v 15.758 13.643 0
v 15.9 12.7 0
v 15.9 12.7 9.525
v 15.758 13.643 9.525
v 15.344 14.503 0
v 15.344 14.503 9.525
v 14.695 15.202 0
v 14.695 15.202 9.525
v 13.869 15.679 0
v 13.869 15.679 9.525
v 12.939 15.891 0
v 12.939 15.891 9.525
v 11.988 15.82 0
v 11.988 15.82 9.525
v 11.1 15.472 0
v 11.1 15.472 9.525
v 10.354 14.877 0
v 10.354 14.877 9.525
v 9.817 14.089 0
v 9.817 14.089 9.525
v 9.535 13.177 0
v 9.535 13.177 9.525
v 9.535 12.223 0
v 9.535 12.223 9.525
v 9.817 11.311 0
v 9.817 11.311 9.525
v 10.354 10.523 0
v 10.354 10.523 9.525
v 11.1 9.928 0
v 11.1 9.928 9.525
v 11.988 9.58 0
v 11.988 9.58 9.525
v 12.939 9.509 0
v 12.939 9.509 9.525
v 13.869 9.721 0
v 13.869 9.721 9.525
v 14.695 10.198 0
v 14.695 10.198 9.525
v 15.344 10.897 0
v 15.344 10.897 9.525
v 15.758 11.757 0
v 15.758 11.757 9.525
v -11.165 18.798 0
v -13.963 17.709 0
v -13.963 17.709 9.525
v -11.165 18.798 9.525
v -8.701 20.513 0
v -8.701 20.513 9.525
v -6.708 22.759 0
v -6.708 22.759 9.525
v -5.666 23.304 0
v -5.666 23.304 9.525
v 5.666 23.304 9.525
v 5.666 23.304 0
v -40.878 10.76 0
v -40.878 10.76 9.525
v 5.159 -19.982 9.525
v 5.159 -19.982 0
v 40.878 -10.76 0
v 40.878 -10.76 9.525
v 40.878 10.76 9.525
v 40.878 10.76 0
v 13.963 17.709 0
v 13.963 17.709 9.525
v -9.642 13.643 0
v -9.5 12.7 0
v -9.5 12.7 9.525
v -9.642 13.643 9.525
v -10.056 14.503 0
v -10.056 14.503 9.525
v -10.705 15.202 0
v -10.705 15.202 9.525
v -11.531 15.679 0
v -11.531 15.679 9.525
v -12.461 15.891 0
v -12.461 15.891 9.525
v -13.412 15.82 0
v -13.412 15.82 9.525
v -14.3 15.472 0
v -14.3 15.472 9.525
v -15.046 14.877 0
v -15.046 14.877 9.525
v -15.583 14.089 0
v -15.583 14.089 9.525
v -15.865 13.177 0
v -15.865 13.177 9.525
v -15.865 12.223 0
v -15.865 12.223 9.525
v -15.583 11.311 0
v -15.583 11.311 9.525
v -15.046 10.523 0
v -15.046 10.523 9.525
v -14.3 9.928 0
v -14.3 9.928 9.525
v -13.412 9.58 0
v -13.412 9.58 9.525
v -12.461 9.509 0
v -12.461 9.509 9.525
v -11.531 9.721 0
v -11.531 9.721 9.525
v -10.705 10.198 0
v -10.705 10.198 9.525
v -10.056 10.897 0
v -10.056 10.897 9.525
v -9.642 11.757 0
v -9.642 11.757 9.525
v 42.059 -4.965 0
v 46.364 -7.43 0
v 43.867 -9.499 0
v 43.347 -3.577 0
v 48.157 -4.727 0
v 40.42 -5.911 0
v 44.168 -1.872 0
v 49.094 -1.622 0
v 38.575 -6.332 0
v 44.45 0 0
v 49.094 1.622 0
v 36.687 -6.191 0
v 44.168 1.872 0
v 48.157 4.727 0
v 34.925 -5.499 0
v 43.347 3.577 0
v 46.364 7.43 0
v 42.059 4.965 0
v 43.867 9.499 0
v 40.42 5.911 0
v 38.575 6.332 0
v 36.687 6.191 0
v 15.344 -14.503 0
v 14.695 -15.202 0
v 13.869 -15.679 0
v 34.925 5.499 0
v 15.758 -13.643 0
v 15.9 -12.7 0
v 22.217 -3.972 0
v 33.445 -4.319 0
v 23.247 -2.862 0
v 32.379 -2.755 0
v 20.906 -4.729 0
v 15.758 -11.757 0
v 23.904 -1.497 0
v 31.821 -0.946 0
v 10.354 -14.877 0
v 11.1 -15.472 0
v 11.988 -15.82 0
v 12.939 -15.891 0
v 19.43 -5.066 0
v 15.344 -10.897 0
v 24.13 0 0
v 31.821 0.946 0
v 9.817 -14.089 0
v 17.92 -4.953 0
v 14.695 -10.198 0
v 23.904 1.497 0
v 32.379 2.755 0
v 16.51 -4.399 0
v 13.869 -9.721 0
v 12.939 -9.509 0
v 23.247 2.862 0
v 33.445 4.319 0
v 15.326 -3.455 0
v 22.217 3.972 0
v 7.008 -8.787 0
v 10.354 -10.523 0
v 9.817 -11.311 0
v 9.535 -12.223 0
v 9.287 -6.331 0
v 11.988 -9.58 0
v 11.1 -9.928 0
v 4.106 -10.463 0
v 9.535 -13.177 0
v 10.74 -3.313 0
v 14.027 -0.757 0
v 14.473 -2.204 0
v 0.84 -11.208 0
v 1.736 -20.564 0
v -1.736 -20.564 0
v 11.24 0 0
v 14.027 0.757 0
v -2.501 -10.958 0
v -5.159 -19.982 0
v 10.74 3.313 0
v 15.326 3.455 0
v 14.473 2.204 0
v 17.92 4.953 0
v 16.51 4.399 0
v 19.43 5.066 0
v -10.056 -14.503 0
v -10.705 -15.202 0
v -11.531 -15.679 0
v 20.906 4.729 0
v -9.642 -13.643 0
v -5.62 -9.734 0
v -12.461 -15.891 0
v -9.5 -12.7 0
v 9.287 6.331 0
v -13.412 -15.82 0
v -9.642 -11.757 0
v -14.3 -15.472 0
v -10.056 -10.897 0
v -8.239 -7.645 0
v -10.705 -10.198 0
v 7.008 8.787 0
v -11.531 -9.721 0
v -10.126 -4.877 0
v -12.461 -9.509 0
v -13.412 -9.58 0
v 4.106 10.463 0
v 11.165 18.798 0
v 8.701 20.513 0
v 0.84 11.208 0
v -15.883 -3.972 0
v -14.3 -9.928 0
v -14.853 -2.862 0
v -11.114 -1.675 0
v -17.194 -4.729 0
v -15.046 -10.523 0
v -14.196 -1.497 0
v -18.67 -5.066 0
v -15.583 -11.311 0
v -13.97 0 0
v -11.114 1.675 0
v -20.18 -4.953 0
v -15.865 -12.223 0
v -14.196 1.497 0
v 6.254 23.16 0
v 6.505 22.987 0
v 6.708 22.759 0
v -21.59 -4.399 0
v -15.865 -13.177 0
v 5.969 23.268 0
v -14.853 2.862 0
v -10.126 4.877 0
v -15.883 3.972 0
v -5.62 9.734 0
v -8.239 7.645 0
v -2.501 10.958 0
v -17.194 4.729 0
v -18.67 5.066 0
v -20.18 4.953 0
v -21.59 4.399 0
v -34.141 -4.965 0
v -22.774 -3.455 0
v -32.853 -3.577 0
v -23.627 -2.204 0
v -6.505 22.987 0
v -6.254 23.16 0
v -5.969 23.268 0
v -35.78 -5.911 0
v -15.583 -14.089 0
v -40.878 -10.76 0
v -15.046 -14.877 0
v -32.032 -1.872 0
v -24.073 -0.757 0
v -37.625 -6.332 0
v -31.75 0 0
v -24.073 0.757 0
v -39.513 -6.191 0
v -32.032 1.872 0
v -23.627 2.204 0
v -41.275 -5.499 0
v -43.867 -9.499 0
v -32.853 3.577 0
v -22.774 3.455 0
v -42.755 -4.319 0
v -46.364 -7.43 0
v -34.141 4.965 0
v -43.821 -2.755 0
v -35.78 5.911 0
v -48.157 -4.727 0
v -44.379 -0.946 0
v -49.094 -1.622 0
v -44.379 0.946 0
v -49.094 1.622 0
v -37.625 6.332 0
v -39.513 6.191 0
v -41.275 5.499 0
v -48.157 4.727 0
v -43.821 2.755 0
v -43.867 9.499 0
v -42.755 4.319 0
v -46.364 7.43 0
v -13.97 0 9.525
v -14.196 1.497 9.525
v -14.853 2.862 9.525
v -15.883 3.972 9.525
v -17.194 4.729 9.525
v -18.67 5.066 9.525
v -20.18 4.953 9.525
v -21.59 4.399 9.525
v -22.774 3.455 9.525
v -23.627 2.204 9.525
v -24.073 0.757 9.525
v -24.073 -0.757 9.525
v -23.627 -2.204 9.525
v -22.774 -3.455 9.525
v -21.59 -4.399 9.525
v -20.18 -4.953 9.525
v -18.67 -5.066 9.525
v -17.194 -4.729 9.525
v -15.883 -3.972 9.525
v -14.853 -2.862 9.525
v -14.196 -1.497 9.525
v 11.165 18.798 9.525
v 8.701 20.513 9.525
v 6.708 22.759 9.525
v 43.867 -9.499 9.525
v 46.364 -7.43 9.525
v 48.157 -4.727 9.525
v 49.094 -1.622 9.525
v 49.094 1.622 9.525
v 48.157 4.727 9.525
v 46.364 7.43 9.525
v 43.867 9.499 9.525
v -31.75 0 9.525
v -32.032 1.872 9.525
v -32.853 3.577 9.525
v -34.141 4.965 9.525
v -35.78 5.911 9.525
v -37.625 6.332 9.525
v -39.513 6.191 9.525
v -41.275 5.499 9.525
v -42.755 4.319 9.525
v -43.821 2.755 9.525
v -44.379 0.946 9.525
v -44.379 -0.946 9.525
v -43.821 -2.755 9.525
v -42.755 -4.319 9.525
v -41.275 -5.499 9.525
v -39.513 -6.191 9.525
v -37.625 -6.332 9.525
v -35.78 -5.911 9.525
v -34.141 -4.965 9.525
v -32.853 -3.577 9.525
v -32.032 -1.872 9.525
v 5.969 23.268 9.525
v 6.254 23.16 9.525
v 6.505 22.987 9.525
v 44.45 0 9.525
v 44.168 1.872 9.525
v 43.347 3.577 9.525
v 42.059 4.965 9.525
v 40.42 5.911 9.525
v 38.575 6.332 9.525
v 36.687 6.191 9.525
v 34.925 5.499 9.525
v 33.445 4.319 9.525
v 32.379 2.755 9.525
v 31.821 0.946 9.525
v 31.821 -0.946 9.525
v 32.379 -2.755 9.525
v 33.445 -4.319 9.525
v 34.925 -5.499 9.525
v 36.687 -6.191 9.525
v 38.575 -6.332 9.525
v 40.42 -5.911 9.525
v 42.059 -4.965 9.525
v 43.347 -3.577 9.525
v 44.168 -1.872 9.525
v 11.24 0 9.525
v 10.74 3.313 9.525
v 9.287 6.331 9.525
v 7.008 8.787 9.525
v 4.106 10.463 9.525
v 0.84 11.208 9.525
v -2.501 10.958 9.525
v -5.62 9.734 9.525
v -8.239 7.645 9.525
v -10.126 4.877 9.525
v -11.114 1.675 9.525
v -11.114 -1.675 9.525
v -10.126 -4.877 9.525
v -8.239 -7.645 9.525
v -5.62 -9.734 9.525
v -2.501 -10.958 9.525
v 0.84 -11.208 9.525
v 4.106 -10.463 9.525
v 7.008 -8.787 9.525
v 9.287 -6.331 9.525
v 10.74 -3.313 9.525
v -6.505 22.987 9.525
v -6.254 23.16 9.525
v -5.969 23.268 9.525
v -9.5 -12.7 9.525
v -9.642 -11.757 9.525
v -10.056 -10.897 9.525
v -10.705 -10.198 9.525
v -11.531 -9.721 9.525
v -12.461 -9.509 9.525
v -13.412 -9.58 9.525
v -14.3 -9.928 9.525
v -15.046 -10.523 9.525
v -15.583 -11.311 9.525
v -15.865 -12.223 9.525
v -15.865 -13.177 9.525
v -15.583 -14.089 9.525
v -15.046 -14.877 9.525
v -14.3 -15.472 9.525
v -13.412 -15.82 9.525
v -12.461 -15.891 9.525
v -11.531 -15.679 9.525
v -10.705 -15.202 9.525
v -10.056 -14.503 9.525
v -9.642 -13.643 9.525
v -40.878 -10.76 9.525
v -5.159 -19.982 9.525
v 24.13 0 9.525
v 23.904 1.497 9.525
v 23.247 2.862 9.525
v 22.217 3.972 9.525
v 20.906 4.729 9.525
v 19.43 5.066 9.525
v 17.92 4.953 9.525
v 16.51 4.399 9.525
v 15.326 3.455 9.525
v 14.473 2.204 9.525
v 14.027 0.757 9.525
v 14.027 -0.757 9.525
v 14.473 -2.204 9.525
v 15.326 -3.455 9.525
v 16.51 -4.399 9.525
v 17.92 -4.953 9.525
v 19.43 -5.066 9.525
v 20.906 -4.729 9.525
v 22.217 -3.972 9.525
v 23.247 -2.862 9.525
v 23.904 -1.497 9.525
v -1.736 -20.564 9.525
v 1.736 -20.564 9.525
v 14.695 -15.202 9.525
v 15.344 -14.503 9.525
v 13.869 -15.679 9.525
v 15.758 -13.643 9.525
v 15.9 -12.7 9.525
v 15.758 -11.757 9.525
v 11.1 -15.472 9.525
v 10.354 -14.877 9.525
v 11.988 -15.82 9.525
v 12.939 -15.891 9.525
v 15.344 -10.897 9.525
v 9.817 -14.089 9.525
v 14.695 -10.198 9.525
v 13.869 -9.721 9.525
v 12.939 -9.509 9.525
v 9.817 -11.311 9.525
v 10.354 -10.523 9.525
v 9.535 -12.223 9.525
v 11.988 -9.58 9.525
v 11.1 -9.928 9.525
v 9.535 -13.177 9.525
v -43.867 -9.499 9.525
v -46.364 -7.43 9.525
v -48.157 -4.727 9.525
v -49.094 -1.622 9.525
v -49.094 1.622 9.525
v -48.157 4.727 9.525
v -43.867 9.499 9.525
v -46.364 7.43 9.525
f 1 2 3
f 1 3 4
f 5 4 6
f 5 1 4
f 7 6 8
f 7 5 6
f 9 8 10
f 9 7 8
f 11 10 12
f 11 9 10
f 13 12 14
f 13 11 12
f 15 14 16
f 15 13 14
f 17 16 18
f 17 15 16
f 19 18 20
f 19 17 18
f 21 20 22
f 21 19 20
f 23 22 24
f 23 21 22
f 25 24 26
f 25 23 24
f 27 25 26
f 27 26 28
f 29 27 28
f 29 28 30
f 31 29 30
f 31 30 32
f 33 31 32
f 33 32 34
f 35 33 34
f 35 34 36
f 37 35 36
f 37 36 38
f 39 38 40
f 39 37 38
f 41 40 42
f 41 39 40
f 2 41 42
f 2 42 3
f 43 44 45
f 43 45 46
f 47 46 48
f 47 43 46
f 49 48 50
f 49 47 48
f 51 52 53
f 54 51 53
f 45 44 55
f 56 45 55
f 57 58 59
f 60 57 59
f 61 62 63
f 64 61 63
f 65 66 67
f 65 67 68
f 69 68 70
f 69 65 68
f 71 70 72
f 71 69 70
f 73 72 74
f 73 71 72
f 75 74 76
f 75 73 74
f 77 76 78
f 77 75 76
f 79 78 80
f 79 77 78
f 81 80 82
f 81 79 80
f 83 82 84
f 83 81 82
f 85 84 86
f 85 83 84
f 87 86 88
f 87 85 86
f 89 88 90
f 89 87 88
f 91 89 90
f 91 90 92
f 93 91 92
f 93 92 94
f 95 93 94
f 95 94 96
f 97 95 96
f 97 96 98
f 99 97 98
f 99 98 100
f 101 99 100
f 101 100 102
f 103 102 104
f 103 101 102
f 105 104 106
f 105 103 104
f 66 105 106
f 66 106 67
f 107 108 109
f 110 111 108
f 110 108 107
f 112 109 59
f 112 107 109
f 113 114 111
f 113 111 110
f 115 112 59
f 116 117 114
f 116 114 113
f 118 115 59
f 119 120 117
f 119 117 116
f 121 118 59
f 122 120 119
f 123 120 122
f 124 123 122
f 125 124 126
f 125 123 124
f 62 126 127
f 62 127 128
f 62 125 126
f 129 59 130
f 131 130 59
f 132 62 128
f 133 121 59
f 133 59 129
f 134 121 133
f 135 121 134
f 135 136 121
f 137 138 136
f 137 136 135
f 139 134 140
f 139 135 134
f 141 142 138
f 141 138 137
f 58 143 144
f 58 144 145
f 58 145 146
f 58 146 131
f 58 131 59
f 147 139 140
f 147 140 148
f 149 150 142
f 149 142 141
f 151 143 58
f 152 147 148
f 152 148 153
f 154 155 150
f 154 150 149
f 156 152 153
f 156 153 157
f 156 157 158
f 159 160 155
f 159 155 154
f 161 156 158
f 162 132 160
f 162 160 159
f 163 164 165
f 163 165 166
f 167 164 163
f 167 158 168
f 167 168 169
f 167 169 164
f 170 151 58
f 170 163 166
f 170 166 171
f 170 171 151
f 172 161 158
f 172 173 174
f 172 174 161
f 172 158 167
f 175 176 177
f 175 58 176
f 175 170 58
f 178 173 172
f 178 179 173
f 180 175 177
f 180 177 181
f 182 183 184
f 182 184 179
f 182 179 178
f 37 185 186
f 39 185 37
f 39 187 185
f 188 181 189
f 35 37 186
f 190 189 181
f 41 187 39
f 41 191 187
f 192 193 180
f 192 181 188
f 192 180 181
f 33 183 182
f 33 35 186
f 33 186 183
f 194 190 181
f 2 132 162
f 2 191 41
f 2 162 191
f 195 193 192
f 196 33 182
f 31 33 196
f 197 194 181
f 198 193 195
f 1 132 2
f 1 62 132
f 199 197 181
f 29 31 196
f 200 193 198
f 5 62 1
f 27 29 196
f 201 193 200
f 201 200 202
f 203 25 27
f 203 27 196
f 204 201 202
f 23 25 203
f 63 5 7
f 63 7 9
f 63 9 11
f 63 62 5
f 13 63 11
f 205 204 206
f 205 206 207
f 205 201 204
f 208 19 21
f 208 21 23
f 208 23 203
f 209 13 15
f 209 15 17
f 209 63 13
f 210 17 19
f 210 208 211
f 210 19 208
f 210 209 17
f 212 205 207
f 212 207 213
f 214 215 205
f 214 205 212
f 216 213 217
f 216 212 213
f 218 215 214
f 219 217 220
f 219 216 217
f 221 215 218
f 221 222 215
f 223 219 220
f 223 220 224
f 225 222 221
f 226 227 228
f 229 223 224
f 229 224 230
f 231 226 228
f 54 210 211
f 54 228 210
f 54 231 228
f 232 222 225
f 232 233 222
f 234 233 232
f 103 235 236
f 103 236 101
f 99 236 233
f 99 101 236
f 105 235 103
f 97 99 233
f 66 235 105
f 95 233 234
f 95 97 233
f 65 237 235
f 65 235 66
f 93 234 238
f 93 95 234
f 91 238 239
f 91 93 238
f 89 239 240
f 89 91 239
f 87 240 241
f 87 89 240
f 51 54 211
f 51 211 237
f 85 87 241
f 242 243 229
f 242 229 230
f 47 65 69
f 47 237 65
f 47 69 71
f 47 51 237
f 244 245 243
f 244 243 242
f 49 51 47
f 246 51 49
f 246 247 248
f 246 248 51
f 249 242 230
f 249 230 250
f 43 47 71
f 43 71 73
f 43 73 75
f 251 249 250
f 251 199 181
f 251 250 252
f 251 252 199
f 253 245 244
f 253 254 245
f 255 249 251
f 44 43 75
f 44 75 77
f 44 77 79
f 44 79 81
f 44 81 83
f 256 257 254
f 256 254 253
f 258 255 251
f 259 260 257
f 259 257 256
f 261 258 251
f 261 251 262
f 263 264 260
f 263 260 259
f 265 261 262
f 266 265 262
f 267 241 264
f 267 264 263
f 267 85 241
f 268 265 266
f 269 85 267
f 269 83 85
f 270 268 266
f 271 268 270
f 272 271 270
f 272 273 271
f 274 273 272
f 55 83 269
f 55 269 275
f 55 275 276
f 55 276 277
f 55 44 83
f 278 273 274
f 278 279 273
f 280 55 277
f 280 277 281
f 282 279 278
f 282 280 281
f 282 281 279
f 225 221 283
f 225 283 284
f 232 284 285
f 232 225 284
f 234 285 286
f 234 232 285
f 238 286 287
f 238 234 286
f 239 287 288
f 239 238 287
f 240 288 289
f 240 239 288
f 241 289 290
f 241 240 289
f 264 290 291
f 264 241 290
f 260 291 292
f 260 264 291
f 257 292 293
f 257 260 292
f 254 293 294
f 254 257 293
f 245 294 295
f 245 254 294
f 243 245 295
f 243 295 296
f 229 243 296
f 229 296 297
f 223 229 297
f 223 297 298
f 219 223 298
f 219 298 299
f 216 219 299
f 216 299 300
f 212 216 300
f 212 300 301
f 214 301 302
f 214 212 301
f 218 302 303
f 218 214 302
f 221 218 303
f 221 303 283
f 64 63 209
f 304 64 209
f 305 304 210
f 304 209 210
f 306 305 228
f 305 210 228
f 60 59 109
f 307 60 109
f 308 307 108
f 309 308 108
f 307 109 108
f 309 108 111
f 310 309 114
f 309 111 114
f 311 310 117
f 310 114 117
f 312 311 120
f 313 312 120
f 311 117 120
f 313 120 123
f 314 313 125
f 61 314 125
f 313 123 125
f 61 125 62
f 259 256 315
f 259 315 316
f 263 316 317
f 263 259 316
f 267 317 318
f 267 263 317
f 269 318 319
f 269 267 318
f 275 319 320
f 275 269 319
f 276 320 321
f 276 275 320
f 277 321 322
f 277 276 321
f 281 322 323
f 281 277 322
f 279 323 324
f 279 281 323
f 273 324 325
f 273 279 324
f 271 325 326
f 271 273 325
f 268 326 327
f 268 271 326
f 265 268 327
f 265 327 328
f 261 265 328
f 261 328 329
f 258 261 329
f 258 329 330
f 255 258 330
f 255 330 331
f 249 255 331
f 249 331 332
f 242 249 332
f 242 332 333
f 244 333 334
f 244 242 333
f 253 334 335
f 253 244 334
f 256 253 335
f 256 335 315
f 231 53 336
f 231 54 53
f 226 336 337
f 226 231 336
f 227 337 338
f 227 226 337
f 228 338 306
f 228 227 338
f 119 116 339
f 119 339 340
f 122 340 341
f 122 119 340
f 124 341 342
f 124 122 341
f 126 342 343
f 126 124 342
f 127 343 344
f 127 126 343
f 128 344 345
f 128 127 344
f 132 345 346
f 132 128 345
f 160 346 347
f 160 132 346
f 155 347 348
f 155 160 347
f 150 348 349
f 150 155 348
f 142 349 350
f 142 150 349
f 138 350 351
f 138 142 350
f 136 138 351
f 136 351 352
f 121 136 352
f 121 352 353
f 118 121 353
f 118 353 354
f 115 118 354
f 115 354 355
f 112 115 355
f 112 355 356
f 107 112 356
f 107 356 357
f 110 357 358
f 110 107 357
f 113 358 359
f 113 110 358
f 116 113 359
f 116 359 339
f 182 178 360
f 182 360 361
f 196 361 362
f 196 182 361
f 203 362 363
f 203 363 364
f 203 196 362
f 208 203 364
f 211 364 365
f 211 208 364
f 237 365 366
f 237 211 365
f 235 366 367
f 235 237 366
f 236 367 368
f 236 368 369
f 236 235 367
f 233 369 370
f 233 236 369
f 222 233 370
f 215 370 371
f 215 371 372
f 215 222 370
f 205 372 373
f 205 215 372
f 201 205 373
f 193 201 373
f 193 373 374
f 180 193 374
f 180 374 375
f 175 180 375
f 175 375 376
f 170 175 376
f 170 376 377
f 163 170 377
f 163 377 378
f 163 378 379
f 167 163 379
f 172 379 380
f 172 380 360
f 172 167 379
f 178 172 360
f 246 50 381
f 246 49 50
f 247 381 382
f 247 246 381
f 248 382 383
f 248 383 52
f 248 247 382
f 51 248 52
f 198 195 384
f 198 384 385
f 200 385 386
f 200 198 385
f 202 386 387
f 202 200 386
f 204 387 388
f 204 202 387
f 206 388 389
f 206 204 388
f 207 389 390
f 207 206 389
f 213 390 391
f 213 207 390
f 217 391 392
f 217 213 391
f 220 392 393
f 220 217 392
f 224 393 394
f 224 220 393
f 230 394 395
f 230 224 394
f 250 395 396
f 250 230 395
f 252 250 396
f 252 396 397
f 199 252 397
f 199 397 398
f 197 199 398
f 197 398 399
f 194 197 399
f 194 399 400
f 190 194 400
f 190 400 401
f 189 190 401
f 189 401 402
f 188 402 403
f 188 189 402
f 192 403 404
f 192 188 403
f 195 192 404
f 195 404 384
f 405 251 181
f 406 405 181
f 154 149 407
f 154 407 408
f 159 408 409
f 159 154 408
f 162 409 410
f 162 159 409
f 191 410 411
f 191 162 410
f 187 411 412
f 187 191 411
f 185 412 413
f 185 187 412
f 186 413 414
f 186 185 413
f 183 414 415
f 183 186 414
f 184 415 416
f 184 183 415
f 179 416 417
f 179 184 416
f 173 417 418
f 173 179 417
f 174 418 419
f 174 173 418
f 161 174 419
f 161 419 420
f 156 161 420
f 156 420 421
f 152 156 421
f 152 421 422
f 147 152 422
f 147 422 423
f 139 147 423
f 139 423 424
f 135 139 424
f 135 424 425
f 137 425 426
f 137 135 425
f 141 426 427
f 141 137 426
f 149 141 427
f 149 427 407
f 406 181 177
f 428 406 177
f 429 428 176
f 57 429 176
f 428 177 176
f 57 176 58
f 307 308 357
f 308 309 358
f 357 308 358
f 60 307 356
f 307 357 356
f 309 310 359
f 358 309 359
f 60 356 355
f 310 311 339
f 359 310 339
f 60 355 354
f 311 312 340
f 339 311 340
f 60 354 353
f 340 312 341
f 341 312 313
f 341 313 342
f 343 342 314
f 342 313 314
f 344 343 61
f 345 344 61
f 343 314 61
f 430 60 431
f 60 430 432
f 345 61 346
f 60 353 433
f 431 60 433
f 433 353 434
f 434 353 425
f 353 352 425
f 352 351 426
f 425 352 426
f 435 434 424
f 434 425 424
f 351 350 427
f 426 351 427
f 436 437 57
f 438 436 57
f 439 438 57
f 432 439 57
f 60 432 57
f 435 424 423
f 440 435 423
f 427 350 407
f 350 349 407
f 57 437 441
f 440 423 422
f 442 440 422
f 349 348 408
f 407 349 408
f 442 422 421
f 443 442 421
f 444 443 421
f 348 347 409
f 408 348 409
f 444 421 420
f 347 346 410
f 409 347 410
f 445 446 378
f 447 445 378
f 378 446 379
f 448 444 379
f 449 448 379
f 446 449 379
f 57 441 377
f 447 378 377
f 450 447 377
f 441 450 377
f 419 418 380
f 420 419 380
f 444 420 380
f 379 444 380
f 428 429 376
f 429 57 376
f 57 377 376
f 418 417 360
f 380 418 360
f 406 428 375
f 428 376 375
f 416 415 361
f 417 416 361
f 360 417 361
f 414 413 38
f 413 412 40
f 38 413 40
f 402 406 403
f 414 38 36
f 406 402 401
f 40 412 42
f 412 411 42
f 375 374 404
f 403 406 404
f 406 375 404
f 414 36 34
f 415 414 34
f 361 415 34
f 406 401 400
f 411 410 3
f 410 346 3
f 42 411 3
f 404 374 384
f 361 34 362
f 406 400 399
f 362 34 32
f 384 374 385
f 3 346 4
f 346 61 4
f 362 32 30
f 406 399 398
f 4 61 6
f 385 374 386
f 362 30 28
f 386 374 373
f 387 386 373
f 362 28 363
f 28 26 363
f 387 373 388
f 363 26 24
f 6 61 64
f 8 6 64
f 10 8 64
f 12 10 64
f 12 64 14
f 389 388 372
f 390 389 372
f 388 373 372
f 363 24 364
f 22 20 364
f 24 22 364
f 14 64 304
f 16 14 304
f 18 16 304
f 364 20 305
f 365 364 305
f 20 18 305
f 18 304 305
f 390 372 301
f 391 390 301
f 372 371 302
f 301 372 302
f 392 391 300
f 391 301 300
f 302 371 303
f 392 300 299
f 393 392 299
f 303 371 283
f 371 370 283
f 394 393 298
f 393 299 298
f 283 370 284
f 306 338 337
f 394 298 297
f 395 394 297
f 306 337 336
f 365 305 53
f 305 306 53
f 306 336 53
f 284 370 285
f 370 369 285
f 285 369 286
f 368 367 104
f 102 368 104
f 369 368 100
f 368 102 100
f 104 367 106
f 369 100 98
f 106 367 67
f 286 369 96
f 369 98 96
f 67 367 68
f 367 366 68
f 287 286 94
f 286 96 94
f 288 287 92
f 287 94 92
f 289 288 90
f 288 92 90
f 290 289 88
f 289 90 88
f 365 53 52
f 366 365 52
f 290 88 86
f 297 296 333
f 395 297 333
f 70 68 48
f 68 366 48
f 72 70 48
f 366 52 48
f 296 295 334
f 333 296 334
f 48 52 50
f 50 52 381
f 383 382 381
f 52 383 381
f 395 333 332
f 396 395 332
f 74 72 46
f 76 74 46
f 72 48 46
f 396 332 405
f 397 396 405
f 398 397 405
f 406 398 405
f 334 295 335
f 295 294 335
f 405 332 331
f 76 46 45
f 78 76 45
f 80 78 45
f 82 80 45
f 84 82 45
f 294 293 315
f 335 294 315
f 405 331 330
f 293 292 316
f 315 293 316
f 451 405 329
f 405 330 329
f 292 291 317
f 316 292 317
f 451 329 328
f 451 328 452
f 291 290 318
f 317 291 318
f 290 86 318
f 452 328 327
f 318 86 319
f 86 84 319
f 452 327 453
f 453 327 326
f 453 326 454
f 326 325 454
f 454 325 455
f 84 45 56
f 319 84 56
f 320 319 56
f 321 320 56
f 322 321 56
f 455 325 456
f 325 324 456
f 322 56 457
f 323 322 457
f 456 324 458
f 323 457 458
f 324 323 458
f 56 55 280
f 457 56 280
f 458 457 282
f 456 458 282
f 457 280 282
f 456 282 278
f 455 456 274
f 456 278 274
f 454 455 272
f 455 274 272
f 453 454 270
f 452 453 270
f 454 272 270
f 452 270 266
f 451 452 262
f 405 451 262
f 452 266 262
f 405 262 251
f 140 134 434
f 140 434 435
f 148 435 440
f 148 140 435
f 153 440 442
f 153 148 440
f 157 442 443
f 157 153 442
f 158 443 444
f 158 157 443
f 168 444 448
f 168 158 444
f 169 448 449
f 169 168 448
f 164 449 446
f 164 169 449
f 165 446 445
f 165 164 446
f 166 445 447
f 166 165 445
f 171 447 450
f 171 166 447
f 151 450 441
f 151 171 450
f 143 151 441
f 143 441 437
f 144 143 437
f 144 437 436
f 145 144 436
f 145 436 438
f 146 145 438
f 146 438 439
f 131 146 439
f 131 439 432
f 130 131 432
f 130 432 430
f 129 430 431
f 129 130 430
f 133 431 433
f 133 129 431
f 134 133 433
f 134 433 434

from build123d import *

# Parameters (mm, degrees)
F0_R        = 3.2004
F0_R_2      = 6.35
F0_R_3      = 5.08
F0_R_4      = 11.2395
F1_DEPTH    = 9.525
F2_W        = 12.7
F2_H        = 5.1071889116
F3_DEPTH    = 9.525
F4_T1_DEPTH = 9.525
F5_R        = 1.27


# Not quite as in the source:
# - a fillet or chamfer that OpenCascade refuses, or shapes differently, is made with other operations: its cross-section is extruded or revolved along the edge and cut away or added


with BuildPart() as f1:
    # F0 (on Top) → F1 (new body)
    with BuildSketch(Plane.XY):
        with BuildLine():
            Line((-5.159375, 19.9821734518), (-40.878125, 10.7596318587))
            ThreePointArc((-40.878125, 10.7596318587), (-49.2125, 0), (-40.878125, -10.7596318587))
            Line((-40.878125, -10.7596318587), (-5.159375, -19.9821734518))
            ThreePointArc((-5.159375, -19.9821734518), (0, -20.6375), (5.159375, -19.9821734518))
            Line((5.159375, -19.9821734518), (40.878125, -10.7596318587))
            ThreePointArc((40.878125, -10.7596318587), (49.2125, 0), (40.878125, 10.7596318587))
            Line((40.878125, 10.7596318587), (5.159375, 19.9821734518))
            ThreePointArc((5.159375, 19.9821734518), (0, 20.6375), (-5.159375, 19.9821734518))
        make_face()
        with Locations((-12.7, -12.7)):
            Circle(F0_R, mode=Mode.SUBTRACT)
        with Locations((12.7, -12.7)):
            Circle(F0_R, mode=Mode.SUBTRACT)
        with Locations((-38.1, 0)):
            Circle(F0_R_2, mode=Mode.SUBTRACT)
        with Locations((-19.05, 0)):
            Circle(F0_R_3, mode=Mode.SUBTRACT)
        with Locations((-12.7, 12.7)):
            Circle(F0_R, mode=Mode.SUBTRACT)
        Circle(F0_R_4, mode=Mode.SUBTRACT)
        with Locations((19.05, 0)):
            Circle(F0_R_3, mode=Mode.SUBTRACT)
        with Locations((38.1, 0)):
            Circle(F0_R_2, mode=Mode.SUBTRACT)
        with Locations((12.7, 12.7)):
            Circle(F0_R, mode=Mode.SUBTRACT)
    extrude(amount=F1_DEPTH)

    # F2 (on face) → F3 (join, through all)
    with BuildSketch(Plane.XY.offset(9.525)):
        with Locations((0, 20.7509055442)):
            Rectangle(F2_W, F2_H)
    extrude(amount=-F3_DEPTH)

    # F4: fillet of radius 12.7 on 2 edges, made by hand

    # F4_s2 → F4_t1 (join)
    with BuildSketch(Plane.XY):
        with BuildLine():
            ThreePointArc((-13.9630832797, 17.7090657484), (-9.6168370541, 19.7724670423), (-6.35, 23.3045))
            Line((-6.35, 23.3045), (-6.35, 19.6747553987))
            Line((-6.35, 19.6747553987), (-13.9630832797, 17.7090657484))
        make_face()
        with BuildLine():
            ThreePointArc((13.9630832797, 17.7090657484), (9.6168370541, 19.7724670423), (6.35, 23.3045))
            Line((6.35, 23.3045), (6.35, 19.6747553987))
            Line((6.35, 19.6747553987), (13.9630832797, 17.7090657484))
        make_face()
    extrude(amount=F4_T1_DEPTH)

    # F5
    f5_edges = [f1.edges().sort_by_distance(p)[0] for p in [
        (-6.35, 23.3045, 4.7625),
        (6.35, 23.3045, 4.7625),
    ]]
    fillet(f5_edges, radius=F5_R)


solid = f1.part
